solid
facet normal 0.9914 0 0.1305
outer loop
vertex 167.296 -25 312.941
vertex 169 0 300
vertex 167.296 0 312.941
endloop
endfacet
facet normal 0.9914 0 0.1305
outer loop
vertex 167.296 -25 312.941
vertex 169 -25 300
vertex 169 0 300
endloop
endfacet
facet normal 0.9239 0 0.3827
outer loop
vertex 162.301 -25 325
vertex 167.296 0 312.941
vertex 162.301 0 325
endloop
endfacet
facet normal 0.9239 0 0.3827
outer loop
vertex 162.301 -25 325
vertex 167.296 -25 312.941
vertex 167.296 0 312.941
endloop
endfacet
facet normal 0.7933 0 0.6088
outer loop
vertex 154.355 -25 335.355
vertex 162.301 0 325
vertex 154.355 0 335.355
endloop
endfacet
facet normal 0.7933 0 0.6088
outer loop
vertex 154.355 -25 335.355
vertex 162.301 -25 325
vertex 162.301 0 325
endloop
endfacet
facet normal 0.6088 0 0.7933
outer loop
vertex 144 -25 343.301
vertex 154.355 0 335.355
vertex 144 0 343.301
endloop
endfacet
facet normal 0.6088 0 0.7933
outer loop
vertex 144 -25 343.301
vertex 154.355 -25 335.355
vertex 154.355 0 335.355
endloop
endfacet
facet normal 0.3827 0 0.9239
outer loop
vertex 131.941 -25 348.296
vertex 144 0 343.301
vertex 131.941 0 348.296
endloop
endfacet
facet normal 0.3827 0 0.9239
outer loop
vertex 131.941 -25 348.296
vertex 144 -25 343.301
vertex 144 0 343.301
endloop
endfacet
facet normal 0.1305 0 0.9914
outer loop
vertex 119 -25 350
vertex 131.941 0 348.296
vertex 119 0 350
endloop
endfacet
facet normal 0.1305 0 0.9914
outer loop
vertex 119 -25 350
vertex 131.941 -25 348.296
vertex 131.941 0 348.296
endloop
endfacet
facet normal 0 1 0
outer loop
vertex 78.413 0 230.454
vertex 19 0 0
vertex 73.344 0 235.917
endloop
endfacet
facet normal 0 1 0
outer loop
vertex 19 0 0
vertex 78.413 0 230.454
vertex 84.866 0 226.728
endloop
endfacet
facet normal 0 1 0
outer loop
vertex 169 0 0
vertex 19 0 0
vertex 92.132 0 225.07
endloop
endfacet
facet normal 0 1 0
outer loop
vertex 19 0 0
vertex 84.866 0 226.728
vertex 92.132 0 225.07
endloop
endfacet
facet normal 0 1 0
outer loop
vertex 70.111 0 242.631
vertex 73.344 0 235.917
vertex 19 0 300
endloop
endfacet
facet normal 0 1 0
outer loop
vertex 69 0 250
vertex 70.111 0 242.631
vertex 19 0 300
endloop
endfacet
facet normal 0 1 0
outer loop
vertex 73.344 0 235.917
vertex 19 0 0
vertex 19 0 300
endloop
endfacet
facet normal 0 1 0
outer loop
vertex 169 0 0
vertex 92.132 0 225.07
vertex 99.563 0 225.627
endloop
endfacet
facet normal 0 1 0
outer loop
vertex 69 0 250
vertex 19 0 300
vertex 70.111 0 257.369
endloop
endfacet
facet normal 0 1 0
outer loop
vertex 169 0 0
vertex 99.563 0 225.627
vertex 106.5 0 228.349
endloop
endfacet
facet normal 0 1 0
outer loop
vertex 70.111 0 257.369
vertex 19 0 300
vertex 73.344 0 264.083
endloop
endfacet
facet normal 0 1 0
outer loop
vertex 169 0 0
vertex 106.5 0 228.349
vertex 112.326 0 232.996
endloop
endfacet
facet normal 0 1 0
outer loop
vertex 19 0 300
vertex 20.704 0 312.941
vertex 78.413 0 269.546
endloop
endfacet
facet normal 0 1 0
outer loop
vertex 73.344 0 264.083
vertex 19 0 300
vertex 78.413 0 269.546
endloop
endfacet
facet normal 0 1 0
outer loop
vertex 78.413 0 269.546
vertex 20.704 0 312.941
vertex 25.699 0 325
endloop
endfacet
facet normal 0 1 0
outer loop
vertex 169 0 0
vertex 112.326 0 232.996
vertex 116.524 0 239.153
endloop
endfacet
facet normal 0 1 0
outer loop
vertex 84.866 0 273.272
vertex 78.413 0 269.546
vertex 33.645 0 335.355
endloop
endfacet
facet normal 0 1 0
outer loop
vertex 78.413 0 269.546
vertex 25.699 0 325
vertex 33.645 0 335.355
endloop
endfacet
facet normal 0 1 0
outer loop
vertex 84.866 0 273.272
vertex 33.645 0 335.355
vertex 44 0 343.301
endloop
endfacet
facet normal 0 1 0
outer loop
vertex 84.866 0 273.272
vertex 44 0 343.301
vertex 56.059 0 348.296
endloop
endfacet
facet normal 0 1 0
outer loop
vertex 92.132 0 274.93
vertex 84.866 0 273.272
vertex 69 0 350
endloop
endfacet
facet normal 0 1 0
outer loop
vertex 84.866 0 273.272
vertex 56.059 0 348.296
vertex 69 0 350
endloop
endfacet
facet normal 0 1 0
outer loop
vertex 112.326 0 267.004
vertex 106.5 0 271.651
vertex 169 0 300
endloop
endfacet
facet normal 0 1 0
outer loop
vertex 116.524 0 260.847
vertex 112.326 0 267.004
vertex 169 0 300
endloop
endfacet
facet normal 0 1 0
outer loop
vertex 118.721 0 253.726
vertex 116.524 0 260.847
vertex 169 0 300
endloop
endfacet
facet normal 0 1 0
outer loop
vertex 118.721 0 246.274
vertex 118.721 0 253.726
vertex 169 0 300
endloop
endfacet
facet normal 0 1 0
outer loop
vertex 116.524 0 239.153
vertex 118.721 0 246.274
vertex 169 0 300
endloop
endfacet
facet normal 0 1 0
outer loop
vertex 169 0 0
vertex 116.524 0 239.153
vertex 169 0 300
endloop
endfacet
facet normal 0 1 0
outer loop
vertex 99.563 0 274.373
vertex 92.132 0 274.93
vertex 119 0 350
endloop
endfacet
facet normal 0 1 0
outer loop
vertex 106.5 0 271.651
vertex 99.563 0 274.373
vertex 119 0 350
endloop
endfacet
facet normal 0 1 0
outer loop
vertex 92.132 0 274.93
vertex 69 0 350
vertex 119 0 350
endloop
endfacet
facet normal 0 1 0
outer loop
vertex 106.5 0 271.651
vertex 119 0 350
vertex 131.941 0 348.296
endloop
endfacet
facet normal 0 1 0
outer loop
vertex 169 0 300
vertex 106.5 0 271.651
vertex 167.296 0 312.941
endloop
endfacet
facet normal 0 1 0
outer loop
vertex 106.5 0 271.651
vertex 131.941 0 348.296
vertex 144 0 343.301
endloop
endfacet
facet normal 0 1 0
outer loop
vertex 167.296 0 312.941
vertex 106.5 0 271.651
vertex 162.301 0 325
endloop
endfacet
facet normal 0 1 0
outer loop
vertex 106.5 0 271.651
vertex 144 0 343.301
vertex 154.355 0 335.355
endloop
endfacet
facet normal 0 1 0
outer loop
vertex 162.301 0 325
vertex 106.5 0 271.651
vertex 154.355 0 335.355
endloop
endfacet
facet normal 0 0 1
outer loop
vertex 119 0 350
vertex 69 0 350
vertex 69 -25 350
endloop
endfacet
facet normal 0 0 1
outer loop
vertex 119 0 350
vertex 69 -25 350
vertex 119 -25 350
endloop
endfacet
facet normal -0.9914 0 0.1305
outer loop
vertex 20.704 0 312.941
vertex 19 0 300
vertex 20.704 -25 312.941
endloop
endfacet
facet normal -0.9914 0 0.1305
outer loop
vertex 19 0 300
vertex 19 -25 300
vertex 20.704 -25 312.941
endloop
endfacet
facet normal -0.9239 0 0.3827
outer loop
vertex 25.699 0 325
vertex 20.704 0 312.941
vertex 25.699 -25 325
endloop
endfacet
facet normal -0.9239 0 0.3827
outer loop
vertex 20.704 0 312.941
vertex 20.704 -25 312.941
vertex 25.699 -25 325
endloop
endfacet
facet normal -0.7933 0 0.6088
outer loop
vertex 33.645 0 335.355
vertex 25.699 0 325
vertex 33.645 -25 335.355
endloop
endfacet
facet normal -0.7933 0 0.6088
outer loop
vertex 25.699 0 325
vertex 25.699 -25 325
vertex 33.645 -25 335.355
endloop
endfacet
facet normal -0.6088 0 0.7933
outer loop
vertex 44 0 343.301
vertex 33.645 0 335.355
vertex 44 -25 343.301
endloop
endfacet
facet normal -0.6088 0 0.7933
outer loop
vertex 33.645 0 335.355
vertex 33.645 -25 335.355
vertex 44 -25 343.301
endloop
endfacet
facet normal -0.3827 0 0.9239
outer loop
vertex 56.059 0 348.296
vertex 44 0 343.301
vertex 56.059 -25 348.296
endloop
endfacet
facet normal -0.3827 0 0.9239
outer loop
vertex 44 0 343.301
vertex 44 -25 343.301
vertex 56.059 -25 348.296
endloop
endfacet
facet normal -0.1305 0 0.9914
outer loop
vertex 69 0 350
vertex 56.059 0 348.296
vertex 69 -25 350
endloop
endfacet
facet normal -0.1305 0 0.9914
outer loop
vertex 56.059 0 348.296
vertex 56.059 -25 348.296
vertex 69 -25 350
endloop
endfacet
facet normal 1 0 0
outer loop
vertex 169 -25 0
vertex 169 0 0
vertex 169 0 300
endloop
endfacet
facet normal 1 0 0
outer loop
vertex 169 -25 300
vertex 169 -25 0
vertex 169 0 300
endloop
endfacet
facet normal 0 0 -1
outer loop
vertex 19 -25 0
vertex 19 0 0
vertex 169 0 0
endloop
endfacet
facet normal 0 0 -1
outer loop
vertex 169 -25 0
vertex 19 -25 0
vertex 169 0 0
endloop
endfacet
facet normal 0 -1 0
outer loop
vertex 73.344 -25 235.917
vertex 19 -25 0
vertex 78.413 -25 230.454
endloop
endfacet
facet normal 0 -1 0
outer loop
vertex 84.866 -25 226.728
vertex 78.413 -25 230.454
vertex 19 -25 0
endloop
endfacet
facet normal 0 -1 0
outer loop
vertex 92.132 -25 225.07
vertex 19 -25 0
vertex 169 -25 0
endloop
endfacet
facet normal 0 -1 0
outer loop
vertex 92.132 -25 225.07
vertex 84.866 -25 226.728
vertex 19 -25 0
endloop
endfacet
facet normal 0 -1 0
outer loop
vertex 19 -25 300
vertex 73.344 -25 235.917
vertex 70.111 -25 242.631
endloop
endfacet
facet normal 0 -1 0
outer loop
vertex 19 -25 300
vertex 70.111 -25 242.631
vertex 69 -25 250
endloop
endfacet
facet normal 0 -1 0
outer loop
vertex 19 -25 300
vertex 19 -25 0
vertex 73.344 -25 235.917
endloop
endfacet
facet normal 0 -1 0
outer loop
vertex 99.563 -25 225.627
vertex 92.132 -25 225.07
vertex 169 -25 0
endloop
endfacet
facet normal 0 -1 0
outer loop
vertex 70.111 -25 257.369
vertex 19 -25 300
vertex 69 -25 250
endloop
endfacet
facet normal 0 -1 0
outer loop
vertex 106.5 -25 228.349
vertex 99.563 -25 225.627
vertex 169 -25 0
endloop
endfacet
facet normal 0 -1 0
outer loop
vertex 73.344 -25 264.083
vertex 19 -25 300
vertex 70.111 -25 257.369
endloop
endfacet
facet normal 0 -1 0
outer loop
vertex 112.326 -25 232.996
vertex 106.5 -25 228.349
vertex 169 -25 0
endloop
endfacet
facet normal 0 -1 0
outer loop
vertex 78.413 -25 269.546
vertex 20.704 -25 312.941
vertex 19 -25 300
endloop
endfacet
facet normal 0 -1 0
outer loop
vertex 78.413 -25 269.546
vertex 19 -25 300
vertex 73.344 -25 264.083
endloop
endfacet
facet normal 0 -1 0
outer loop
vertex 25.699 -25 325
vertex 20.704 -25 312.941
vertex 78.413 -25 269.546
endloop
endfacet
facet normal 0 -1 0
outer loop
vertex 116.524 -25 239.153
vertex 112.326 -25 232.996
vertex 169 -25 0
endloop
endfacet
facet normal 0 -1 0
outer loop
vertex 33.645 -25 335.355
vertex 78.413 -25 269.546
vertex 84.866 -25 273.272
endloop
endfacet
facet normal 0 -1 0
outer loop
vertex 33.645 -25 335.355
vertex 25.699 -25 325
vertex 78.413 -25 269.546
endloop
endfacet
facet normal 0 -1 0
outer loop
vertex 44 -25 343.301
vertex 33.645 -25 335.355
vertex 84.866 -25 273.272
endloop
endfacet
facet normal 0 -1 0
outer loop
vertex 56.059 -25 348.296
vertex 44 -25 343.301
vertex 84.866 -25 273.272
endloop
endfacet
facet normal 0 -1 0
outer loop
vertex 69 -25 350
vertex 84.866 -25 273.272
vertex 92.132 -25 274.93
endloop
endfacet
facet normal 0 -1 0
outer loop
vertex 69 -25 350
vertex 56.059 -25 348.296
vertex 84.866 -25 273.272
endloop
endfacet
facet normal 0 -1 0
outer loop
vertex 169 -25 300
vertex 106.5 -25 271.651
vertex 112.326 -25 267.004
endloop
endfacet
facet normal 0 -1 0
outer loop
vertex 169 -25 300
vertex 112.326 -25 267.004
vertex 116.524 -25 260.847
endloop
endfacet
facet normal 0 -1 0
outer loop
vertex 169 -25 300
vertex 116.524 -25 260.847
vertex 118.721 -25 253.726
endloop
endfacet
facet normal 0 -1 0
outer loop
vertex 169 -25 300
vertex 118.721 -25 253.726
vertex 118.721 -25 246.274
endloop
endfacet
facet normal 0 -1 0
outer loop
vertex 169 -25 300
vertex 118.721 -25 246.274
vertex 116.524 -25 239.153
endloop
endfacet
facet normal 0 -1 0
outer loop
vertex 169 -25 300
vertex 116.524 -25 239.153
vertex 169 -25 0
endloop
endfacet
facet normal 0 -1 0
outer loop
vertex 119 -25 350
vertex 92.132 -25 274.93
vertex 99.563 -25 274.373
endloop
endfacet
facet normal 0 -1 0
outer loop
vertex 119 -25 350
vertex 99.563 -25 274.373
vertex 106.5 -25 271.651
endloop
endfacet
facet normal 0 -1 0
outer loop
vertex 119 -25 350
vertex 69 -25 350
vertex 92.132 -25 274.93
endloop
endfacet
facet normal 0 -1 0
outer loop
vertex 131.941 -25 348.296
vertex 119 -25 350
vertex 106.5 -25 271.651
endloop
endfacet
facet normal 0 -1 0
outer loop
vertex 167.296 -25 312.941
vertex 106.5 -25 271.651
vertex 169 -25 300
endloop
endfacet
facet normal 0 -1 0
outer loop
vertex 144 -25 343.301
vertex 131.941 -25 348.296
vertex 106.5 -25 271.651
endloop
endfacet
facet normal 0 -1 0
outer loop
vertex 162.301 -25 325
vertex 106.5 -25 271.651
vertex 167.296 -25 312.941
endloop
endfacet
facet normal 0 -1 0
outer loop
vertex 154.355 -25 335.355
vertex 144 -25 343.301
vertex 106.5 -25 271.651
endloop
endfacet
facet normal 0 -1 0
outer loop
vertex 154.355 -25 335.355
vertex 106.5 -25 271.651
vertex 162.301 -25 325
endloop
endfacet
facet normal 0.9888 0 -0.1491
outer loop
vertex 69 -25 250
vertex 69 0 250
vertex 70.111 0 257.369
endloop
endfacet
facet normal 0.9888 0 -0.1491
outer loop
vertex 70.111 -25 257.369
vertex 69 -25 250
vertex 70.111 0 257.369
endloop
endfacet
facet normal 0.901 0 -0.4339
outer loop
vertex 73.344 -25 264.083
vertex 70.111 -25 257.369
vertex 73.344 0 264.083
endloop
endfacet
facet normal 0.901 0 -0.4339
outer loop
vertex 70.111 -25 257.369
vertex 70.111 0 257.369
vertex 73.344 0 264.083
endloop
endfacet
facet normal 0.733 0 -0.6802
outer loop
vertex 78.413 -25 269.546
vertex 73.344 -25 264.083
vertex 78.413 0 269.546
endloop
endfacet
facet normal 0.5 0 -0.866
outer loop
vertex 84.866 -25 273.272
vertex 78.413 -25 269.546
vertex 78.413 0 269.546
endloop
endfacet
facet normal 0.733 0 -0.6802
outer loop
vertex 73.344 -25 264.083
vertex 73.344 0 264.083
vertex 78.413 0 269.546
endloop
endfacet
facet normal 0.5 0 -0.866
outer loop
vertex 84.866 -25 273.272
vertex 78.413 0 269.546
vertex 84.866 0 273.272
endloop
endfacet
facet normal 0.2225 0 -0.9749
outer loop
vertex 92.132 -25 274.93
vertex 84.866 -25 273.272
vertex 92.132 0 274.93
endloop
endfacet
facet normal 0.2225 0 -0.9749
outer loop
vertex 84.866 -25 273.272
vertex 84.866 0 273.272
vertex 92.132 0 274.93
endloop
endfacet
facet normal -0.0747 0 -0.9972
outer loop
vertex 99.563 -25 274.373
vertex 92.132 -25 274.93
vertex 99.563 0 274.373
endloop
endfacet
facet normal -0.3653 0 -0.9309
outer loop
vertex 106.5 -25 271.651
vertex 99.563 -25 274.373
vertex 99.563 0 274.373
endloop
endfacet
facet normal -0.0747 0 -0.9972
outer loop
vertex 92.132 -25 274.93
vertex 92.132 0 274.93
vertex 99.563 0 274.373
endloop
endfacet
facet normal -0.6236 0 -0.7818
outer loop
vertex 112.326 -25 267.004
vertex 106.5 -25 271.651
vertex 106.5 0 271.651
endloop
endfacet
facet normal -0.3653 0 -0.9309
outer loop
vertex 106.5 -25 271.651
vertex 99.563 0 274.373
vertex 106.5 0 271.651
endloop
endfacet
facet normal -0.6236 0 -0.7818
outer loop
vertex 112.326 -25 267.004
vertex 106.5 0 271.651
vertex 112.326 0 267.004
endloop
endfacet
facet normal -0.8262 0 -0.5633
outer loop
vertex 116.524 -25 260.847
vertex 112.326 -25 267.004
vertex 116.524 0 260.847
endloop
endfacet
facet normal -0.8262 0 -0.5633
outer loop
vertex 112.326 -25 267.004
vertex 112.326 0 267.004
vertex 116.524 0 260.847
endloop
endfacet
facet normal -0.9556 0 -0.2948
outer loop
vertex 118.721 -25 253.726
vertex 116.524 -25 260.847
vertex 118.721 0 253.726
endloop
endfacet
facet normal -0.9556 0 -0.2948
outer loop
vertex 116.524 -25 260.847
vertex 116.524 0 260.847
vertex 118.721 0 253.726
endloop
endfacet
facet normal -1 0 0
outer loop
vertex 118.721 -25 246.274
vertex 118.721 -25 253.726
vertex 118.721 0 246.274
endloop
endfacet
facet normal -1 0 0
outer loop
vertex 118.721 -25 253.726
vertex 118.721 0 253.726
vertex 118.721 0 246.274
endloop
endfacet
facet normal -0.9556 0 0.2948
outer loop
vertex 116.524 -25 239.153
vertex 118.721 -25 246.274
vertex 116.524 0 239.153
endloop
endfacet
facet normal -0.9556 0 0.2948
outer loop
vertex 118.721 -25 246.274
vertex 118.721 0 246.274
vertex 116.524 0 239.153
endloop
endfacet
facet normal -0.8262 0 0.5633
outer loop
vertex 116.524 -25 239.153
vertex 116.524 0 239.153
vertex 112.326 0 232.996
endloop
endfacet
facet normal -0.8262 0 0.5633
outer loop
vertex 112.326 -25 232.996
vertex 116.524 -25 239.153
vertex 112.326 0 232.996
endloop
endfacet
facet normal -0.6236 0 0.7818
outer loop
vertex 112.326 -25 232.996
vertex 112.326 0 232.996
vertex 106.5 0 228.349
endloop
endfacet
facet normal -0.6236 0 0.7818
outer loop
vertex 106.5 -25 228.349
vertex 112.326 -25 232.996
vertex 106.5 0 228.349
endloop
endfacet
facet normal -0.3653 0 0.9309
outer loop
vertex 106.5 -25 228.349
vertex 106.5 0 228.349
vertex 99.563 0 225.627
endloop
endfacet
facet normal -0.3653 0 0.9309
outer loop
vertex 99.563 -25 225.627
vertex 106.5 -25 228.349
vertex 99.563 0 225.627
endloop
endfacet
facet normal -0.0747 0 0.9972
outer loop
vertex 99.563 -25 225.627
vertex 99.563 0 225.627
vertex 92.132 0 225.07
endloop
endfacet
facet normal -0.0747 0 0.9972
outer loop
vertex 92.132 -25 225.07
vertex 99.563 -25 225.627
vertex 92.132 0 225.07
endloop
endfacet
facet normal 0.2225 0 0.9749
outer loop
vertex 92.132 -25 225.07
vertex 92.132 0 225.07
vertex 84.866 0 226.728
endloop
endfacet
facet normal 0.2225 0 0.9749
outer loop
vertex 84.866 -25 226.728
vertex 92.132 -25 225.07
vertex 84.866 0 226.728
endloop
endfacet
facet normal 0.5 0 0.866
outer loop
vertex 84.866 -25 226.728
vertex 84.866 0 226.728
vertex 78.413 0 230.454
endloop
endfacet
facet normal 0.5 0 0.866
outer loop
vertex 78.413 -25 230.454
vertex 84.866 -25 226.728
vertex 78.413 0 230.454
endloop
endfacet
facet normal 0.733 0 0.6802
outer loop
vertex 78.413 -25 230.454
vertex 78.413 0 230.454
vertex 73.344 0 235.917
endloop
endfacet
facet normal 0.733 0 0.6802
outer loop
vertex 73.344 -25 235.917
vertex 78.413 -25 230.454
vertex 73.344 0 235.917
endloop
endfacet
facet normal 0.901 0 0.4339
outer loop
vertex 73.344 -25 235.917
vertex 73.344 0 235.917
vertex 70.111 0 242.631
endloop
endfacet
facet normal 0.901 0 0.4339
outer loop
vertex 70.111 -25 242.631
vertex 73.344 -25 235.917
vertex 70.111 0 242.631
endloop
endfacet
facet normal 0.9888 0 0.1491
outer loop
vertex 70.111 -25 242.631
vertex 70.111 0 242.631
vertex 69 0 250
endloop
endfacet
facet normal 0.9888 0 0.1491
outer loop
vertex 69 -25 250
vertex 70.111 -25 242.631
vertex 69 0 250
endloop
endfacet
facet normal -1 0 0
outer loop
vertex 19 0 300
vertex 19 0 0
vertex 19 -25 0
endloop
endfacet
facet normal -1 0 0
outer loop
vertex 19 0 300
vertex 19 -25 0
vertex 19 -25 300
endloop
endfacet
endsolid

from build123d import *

# Parameters (mm, degrees)
F0_W     = 150
F0_H     = 350
F1_DEPTH = 25
F2_R     = 50
F4_D     = 50


with BuildPart() as f1:
    # F0 (on Front) → F1 (new body)
    with BuildSketch(Plane.XZ):
        with Locations((94.000003, 175)):
            Rectangle(F0_W, F0_H)
    extrude(amount=F1_DEPTH)

    # F2
    f2_edges = [f1.edges().sort_by_distance(p)[0] for p in [
        (19.000003, -12.5, 350),
        (169.000003, -12.5, 350),
    ]]
    fillet(f2_edges, radius=F2_R)

    # F4 (through all)
    with Locations(Plane.XZ.offset(25)):
        with Locations((94.000003, 250)):
            Hole(F4_D / 2)


solid = f1.part
